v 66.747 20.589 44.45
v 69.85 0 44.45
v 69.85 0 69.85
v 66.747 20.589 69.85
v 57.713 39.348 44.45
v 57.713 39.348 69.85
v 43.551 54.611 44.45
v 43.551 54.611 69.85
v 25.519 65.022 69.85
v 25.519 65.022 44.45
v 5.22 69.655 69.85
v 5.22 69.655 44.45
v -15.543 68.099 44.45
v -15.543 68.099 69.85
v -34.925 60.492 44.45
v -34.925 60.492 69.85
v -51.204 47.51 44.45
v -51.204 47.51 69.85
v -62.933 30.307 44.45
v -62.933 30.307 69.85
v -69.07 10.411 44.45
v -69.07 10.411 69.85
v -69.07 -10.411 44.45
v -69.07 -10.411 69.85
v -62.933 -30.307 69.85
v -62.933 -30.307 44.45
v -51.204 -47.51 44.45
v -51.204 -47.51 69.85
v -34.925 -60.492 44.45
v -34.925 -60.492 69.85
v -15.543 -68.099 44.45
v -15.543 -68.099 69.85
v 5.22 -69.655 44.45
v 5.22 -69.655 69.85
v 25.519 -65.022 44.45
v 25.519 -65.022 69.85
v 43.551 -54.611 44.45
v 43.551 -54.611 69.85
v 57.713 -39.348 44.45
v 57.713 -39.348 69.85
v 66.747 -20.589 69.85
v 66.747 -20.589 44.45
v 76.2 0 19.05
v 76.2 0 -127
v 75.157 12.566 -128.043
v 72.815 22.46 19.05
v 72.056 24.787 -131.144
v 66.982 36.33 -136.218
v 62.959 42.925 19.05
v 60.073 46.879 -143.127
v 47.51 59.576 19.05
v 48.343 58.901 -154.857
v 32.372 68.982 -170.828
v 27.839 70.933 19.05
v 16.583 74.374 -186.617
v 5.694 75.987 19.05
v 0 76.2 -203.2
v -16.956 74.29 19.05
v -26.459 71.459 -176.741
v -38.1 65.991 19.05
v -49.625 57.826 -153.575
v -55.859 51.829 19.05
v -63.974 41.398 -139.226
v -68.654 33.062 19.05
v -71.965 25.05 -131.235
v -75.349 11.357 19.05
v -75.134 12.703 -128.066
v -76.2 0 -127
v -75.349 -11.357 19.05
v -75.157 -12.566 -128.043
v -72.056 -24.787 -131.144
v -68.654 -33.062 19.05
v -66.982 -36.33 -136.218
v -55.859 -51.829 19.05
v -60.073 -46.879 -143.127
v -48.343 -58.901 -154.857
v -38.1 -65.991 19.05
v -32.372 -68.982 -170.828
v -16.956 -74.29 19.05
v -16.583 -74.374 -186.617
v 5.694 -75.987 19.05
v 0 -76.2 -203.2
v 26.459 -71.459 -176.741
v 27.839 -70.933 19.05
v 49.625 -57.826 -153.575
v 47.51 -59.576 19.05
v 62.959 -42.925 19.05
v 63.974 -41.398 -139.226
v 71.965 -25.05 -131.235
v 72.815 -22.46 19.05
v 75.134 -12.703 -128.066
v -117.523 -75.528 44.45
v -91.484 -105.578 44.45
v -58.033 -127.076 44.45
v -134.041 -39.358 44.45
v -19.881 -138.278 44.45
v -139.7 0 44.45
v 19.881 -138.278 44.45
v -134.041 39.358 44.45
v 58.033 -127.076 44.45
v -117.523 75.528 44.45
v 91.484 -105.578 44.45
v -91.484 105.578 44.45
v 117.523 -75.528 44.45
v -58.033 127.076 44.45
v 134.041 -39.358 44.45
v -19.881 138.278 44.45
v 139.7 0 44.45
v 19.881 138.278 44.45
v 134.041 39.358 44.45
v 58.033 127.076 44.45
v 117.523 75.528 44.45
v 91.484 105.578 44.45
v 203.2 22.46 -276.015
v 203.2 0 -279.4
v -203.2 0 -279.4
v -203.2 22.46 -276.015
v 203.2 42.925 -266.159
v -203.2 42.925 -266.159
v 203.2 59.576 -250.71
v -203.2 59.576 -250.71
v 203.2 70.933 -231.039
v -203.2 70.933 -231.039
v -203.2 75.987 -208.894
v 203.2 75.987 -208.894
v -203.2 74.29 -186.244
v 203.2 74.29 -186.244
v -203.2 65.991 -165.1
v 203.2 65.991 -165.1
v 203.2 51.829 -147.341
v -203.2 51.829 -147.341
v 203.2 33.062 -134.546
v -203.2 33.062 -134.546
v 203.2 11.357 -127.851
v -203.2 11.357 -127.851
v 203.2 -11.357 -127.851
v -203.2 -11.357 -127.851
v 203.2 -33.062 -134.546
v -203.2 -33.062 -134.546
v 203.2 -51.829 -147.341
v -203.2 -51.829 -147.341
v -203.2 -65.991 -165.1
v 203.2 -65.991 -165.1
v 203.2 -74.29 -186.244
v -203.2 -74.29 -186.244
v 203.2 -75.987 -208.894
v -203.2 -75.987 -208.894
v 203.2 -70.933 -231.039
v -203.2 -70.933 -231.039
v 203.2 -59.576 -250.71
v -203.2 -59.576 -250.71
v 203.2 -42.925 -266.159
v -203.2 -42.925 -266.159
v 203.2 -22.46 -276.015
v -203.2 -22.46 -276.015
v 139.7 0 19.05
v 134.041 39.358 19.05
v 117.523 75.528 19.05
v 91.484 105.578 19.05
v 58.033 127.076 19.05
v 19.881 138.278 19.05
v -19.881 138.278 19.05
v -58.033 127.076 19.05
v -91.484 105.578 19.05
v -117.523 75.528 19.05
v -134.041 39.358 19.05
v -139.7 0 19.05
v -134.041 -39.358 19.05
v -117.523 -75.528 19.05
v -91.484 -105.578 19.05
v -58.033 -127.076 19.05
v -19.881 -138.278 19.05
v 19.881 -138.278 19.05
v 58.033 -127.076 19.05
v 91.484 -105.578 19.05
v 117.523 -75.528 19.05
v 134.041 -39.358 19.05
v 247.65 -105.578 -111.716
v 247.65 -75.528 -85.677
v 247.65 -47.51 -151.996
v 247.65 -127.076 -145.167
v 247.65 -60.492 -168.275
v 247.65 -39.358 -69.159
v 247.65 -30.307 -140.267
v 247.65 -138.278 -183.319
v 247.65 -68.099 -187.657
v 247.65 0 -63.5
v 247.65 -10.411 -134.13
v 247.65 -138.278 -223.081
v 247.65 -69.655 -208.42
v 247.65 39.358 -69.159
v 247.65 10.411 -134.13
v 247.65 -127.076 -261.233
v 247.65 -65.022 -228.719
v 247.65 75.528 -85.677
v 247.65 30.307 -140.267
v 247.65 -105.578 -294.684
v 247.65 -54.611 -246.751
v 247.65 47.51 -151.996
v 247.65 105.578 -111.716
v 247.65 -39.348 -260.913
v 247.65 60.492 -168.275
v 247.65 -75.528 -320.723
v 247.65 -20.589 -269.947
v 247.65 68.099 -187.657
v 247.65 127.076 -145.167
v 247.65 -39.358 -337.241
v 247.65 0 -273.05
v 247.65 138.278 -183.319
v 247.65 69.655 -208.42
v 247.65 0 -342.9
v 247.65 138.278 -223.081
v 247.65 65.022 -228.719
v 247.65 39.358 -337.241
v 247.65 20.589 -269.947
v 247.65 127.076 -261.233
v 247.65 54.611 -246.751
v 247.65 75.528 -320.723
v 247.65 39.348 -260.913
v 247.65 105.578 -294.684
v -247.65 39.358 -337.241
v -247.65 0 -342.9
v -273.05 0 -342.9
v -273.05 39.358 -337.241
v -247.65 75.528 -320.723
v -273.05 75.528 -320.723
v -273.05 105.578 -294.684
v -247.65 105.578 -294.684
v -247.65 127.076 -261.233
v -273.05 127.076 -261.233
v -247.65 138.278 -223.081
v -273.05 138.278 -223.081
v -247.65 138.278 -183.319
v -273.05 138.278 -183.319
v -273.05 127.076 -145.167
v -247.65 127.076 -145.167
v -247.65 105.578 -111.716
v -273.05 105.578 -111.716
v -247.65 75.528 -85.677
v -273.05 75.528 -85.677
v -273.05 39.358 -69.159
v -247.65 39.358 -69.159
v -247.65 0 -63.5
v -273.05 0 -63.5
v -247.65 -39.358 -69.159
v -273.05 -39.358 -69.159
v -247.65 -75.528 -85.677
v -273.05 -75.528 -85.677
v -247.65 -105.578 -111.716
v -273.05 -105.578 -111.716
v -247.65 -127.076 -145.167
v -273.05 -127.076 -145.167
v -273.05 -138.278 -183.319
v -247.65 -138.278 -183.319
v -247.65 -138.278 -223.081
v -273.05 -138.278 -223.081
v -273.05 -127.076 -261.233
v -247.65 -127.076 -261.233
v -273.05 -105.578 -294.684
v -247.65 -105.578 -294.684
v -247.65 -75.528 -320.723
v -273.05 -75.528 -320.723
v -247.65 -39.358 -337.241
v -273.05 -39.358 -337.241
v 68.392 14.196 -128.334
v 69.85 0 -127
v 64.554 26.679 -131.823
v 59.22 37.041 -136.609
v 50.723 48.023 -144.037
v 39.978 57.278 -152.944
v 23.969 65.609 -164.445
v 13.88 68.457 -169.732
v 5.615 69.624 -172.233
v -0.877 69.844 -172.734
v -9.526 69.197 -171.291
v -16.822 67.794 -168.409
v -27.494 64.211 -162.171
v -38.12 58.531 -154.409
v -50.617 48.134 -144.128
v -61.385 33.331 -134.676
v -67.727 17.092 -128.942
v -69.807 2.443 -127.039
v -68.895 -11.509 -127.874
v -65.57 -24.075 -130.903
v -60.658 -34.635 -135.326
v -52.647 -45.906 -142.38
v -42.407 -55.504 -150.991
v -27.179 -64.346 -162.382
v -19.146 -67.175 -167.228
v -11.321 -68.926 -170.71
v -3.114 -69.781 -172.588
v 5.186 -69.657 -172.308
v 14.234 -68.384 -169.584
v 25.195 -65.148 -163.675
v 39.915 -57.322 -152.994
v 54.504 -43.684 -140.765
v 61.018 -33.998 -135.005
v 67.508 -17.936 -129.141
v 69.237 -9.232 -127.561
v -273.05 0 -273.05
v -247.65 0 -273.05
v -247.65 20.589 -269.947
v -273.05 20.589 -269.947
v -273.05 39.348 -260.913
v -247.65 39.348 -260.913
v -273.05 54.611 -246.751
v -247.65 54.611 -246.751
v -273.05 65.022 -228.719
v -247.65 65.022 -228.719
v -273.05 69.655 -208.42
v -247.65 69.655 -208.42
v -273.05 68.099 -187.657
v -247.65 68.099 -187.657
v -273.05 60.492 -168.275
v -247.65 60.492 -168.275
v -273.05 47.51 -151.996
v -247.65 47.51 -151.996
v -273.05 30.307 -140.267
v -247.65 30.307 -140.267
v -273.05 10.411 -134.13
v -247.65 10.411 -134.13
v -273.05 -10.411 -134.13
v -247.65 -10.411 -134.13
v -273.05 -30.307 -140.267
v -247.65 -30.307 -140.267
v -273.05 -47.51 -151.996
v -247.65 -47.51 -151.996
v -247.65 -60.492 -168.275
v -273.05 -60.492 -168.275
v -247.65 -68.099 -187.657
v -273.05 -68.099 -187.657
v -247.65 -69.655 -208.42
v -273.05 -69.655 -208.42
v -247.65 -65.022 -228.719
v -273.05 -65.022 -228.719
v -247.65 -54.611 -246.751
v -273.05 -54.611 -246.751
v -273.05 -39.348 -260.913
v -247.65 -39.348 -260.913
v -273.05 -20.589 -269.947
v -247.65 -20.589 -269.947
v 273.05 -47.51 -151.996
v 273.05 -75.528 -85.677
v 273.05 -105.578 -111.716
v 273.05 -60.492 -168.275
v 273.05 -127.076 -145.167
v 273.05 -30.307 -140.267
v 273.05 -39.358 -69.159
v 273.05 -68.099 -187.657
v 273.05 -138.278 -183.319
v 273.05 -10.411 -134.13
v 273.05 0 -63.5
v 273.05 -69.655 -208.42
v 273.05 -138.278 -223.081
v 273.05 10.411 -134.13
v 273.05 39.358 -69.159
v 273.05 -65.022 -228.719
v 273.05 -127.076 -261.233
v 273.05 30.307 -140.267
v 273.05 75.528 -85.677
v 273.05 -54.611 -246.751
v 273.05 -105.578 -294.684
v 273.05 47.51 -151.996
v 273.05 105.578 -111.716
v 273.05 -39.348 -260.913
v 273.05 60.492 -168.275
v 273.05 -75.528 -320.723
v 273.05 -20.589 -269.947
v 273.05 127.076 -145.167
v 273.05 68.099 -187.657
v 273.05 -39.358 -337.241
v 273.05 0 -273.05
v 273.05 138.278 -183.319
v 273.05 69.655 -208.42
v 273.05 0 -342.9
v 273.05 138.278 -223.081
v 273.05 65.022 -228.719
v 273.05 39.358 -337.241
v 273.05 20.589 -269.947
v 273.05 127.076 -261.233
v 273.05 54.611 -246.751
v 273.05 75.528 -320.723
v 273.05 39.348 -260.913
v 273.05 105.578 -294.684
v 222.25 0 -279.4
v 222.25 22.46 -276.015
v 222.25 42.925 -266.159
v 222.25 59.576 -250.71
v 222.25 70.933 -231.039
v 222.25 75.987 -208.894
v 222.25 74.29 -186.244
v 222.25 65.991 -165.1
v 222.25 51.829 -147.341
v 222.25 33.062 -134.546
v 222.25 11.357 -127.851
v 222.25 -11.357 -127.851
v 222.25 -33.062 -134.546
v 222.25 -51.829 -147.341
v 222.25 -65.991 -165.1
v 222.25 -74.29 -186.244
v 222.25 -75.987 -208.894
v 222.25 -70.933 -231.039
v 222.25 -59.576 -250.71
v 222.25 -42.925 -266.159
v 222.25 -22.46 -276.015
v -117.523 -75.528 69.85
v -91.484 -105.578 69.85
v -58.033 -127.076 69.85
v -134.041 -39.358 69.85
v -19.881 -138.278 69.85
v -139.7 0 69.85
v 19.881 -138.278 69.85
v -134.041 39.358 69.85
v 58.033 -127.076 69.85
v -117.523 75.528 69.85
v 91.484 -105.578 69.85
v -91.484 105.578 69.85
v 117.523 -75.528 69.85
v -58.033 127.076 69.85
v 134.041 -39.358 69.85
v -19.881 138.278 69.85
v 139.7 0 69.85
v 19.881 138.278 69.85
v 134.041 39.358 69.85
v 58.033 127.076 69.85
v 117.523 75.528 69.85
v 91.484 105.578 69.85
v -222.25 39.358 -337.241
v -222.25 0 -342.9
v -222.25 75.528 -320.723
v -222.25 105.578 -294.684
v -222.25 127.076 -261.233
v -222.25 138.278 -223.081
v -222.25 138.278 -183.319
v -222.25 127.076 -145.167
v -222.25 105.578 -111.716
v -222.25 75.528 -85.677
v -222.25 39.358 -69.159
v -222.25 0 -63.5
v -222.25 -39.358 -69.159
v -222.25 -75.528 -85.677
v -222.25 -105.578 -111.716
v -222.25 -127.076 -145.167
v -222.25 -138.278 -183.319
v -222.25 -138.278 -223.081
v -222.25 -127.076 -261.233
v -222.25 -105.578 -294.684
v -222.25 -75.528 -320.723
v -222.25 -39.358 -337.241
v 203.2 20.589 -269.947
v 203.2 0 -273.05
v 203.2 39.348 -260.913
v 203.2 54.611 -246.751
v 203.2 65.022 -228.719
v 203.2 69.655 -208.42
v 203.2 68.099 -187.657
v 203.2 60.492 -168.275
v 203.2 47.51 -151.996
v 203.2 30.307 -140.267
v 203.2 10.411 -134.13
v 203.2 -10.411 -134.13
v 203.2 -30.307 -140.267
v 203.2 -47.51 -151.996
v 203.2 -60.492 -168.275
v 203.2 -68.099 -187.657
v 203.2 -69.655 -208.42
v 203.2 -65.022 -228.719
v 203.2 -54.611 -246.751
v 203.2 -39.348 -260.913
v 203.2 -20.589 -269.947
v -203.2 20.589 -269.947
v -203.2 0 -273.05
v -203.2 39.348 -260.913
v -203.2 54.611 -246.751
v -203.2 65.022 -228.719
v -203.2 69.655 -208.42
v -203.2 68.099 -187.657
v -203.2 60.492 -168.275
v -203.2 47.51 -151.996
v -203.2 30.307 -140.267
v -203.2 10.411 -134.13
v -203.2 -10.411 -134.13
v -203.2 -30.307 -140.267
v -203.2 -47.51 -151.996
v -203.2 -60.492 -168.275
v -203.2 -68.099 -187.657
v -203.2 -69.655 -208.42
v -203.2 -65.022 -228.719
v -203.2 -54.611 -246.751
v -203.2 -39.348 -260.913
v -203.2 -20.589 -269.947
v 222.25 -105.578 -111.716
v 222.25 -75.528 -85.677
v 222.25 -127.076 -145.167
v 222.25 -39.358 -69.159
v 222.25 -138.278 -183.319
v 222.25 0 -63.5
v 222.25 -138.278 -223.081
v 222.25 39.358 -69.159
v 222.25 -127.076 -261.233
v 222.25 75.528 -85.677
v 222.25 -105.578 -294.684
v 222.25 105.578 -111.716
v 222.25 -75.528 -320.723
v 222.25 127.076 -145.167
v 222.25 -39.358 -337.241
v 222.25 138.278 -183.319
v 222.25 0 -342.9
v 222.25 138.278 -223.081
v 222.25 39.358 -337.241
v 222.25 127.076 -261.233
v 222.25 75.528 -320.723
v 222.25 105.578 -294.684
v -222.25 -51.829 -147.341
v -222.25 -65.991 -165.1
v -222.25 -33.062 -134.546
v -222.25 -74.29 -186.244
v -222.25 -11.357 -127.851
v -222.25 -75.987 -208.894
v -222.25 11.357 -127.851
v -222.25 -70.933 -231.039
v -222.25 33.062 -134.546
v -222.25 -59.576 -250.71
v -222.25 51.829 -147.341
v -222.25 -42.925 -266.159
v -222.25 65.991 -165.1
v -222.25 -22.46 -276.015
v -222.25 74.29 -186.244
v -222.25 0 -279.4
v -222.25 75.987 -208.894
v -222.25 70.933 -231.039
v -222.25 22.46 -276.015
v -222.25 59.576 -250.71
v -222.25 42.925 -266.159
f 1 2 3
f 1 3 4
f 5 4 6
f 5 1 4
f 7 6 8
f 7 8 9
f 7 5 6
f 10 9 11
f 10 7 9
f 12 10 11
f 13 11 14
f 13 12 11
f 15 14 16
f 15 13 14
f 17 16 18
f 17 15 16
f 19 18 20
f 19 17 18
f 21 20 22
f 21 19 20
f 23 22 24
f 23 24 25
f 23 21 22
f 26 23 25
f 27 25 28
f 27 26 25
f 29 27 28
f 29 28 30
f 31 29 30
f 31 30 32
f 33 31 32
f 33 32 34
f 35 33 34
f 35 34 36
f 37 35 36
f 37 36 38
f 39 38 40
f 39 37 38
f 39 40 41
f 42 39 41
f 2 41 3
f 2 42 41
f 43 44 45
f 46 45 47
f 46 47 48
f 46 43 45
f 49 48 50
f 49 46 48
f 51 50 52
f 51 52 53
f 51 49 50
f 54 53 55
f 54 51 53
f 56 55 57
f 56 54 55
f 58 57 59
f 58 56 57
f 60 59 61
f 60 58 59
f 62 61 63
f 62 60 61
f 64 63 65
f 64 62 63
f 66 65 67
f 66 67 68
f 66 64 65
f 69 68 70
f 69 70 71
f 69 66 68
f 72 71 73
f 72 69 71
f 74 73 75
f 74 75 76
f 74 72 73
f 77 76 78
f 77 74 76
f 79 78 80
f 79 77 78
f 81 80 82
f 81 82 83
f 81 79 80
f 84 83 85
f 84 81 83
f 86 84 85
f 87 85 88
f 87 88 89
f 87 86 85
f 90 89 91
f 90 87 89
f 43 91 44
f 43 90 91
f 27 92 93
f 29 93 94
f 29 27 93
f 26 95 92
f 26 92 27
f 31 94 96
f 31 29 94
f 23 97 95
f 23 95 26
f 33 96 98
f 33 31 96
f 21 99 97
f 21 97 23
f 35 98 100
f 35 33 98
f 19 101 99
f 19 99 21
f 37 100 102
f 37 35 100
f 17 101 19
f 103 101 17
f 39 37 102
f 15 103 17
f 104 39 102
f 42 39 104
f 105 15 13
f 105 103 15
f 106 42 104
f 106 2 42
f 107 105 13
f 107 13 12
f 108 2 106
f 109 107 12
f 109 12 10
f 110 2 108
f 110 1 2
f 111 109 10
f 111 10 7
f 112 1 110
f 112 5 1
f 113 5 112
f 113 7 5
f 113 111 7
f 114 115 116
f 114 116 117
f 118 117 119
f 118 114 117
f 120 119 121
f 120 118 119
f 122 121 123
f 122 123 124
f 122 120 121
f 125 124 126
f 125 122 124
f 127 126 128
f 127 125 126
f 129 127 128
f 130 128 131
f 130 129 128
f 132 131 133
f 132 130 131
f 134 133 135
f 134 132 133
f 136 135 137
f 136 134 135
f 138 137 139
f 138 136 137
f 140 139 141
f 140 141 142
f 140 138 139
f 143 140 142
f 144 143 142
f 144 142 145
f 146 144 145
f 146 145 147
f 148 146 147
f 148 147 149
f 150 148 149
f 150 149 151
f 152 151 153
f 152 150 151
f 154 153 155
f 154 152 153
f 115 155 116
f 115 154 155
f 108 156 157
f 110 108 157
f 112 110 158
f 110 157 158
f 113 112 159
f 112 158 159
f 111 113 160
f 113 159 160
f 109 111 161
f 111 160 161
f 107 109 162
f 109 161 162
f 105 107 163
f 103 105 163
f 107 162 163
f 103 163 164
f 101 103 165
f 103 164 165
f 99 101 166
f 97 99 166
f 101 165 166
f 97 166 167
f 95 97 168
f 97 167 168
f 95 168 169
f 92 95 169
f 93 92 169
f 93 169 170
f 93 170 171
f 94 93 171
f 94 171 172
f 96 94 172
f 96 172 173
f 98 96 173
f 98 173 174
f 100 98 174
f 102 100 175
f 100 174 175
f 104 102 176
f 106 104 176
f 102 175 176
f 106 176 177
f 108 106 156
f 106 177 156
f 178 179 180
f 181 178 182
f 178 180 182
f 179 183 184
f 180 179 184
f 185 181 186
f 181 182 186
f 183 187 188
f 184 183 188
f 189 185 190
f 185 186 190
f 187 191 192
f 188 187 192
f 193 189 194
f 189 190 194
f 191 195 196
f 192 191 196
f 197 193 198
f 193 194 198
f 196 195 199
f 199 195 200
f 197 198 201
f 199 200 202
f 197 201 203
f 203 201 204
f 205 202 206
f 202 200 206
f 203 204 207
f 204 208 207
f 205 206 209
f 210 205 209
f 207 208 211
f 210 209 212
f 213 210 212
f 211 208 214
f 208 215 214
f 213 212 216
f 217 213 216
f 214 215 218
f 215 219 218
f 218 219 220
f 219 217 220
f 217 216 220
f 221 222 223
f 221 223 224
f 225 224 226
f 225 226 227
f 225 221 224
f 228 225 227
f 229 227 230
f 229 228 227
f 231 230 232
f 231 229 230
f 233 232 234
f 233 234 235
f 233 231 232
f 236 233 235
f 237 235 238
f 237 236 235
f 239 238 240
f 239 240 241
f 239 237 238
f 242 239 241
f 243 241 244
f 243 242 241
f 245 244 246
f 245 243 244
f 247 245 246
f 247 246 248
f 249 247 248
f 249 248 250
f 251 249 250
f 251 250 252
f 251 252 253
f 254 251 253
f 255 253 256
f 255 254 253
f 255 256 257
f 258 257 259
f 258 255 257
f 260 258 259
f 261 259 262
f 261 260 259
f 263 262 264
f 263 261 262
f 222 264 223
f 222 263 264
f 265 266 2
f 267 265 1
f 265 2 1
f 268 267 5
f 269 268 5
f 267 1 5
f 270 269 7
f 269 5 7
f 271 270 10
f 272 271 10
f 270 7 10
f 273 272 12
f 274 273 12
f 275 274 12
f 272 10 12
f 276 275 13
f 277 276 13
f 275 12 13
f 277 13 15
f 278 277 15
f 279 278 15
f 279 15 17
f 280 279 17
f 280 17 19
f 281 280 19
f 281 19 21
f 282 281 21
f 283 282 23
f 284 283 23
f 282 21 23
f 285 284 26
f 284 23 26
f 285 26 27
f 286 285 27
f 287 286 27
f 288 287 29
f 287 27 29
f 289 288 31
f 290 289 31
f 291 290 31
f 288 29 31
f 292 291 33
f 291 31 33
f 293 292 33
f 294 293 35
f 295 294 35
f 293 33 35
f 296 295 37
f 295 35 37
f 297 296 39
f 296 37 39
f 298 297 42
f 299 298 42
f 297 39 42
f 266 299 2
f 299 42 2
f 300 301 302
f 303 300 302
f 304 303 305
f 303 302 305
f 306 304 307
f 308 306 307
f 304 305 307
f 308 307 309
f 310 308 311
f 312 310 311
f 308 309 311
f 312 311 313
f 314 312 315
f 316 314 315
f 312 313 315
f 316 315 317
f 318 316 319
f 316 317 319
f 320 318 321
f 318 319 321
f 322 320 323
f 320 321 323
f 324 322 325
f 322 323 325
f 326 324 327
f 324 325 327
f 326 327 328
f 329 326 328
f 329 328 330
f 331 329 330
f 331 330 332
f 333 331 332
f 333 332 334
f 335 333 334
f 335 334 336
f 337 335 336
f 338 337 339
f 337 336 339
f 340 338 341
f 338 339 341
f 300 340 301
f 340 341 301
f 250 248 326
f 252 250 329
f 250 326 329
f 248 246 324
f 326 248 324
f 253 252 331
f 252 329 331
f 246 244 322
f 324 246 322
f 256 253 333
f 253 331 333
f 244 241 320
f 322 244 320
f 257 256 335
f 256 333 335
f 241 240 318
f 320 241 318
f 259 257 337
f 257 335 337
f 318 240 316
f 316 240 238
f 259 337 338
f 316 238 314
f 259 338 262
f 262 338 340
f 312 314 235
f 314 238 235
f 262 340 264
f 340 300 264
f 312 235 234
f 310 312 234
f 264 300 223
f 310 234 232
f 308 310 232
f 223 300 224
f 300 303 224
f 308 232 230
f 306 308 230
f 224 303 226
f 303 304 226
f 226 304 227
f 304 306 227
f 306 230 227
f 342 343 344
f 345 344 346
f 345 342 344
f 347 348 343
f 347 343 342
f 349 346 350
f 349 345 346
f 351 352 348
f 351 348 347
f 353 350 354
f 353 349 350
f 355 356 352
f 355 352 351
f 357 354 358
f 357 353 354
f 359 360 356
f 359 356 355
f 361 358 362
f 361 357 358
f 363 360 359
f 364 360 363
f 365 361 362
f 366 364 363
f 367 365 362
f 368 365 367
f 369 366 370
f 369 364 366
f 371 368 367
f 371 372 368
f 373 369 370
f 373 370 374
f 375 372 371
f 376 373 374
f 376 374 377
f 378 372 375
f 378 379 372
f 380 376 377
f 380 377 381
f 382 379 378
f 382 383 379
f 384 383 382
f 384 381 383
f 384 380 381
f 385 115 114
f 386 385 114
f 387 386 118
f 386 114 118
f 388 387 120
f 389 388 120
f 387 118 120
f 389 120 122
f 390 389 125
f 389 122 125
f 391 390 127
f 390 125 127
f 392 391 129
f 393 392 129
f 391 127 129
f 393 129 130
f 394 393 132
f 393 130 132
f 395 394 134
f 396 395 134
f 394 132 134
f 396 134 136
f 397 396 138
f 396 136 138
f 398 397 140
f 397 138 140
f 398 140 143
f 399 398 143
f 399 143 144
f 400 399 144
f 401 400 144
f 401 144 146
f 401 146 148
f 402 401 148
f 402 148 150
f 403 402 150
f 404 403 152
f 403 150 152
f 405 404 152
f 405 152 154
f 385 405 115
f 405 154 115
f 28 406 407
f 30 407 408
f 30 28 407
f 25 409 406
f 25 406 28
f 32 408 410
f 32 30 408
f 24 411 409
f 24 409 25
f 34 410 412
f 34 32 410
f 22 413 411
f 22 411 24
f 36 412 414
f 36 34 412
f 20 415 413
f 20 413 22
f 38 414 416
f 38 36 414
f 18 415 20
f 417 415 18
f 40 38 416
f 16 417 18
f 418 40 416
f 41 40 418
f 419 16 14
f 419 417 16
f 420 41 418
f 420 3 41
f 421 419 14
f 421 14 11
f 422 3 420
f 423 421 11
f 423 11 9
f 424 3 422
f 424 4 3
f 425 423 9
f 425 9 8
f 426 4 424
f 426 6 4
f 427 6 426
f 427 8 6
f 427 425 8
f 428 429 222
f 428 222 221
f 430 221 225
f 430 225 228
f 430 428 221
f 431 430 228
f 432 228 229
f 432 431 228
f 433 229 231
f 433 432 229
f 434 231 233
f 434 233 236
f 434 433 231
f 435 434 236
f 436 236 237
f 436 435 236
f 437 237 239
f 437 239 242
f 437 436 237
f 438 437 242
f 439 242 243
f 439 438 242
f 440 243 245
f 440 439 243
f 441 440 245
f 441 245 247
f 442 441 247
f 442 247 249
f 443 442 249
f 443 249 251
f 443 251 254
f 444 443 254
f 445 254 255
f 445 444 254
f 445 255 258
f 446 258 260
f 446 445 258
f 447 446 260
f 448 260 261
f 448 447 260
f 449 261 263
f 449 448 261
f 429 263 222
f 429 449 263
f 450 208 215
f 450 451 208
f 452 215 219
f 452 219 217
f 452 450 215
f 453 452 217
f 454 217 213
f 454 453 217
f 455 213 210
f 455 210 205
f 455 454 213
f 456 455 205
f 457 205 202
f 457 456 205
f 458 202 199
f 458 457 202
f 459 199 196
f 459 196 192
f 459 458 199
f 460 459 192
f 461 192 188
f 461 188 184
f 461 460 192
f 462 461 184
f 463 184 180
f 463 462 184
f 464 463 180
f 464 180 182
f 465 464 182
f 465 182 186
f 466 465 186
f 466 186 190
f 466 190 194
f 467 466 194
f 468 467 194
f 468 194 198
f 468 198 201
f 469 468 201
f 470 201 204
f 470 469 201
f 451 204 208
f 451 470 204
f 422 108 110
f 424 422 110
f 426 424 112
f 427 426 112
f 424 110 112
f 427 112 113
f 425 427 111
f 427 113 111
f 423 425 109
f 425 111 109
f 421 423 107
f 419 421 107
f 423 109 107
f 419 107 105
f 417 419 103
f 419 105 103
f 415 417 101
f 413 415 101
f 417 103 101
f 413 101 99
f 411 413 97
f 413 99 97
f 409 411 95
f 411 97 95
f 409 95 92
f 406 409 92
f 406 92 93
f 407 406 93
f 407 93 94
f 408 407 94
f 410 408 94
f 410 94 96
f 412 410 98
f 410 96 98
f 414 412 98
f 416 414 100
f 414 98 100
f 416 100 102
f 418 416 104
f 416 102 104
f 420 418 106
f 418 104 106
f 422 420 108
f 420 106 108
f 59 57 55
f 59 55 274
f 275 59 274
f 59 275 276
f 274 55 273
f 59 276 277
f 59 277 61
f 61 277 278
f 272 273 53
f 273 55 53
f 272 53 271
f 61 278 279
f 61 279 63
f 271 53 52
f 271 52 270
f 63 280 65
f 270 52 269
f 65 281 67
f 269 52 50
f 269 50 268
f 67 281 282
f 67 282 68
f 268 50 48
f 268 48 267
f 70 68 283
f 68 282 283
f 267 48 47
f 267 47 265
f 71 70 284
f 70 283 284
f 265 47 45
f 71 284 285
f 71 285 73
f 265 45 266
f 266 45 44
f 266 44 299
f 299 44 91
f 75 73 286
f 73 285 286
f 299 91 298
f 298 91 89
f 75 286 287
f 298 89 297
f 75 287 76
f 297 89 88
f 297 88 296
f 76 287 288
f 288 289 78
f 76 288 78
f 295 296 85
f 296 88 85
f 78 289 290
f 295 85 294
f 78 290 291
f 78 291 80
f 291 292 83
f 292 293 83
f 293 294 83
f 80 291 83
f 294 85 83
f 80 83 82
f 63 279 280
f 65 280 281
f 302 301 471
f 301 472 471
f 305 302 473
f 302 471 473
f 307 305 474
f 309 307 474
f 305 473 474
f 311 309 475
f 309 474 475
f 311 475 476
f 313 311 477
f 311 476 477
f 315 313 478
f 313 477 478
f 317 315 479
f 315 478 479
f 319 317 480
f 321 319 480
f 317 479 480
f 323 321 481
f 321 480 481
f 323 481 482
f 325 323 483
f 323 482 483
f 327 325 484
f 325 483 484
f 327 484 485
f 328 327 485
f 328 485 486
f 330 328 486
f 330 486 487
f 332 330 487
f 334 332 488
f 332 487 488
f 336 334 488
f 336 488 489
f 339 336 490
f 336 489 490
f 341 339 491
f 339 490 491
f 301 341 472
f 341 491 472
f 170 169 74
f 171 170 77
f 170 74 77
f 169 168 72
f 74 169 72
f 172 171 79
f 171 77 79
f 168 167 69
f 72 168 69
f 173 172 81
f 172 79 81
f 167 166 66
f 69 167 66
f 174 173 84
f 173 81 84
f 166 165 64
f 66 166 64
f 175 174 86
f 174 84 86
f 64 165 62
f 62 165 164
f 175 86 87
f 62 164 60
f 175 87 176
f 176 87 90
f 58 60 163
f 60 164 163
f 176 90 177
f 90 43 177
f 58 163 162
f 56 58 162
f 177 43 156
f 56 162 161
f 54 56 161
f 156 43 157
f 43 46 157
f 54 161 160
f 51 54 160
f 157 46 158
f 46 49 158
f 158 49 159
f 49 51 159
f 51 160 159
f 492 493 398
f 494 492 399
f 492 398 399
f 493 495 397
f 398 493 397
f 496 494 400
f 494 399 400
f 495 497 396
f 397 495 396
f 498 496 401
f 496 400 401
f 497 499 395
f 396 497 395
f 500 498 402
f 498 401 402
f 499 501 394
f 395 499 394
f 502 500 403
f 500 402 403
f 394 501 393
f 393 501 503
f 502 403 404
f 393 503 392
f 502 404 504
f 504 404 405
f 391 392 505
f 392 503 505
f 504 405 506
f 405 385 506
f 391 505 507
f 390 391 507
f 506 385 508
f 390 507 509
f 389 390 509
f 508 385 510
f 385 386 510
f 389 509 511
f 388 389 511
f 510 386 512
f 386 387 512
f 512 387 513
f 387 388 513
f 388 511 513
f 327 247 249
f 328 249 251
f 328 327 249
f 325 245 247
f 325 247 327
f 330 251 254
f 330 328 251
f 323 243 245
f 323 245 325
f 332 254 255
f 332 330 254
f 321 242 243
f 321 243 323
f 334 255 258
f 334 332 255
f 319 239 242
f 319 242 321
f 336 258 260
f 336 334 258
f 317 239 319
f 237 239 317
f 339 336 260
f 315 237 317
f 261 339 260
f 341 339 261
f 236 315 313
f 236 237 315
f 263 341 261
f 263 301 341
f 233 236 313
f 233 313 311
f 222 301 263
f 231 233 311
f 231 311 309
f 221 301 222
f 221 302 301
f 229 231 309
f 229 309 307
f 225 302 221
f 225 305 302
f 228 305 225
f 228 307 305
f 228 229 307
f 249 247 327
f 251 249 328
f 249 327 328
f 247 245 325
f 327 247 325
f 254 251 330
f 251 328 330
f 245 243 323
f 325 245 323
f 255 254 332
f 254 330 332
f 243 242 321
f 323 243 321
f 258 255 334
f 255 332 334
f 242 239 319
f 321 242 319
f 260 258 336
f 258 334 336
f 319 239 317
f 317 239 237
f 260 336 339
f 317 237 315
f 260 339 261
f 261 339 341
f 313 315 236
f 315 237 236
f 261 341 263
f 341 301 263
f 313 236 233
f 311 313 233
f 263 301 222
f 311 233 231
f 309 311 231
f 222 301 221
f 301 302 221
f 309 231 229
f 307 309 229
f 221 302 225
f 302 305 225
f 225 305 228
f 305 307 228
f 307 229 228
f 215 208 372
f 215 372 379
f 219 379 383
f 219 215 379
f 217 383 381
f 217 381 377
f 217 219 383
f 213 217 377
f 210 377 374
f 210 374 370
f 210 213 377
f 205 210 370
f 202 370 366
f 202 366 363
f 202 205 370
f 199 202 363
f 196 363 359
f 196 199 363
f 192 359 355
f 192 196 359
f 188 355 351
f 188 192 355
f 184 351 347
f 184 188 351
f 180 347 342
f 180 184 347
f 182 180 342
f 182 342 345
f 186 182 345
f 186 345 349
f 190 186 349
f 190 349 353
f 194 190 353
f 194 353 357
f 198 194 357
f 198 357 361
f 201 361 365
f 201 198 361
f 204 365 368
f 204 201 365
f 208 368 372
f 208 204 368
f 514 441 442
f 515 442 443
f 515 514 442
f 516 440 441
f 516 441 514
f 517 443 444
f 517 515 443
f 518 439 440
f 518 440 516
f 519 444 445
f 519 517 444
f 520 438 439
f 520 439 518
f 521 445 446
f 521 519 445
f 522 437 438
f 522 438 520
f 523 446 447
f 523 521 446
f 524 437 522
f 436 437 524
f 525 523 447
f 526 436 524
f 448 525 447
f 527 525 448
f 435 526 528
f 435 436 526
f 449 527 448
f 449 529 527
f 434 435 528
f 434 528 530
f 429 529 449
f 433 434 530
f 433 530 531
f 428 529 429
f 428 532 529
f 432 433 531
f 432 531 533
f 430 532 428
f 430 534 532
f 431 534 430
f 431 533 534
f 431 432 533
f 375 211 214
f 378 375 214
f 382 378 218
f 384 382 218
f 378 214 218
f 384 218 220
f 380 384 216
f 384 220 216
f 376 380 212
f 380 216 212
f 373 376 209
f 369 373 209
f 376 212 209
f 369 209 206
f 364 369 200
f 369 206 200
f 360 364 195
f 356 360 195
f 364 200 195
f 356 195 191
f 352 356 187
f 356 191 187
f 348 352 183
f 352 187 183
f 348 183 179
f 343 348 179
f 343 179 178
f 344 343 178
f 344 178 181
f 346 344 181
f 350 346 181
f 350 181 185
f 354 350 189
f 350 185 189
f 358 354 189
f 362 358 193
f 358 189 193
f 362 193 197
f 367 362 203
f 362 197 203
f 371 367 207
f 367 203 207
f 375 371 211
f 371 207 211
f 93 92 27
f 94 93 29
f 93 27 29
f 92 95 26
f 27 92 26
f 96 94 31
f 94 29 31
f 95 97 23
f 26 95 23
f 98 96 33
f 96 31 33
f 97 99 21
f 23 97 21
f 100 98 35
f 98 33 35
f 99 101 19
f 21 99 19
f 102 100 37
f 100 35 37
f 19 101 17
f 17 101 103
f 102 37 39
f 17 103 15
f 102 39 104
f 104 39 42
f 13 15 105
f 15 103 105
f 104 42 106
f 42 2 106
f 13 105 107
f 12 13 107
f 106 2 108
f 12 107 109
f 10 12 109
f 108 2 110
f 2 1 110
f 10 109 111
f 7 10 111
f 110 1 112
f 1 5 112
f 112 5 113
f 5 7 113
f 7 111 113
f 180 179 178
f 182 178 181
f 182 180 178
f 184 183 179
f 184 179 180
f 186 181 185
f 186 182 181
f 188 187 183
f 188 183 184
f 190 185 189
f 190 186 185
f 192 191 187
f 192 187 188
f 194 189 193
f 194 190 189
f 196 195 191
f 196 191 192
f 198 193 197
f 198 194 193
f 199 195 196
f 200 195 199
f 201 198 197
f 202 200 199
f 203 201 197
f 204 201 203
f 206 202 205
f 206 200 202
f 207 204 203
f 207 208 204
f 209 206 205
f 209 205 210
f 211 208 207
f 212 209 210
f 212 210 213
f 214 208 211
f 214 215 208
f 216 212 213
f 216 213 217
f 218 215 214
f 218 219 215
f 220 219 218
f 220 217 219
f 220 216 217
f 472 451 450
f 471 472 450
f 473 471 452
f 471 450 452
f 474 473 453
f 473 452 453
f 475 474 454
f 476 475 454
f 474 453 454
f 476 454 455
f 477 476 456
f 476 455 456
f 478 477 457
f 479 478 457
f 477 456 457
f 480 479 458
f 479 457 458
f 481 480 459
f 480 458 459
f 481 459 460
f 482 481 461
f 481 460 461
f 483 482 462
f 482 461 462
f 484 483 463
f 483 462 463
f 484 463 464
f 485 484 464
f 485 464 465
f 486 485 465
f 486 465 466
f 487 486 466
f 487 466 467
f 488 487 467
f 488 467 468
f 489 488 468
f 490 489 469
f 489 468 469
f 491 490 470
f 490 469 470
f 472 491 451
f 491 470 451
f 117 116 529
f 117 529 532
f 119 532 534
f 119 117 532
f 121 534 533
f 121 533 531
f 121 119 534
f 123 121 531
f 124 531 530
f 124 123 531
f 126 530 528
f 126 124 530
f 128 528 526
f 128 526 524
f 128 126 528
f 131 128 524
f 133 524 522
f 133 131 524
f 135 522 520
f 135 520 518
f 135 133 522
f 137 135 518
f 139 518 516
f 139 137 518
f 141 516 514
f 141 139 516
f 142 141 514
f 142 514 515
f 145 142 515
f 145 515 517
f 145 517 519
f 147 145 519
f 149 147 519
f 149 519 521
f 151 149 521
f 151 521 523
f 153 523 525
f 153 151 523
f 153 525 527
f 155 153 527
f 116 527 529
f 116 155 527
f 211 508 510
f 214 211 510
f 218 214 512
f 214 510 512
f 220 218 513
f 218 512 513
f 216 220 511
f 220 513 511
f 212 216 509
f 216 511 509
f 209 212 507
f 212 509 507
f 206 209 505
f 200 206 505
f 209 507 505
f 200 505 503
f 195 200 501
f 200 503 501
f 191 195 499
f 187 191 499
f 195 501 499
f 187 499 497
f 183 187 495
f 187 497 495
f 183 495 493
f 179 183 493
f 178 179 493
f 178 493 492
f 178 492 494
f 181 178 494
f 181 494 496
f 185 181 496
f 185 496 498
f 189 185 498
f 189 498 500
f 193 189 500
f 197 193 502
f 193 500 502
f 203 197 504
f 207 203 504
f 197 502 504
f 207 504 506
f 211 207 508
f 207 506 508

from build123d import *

# Parameters (mm, degrees)
F0_R      = 76.2
F0_R_2    = 69.85
F1_DEPTH  = 19.05
F2_R      = 139.7
F2_R_2    = 76.2
F2_R_3    = 69.85
F3_DEPTH  = 25.4
F9_ANGLE  = 90
F11_DEPTH = 406.4
F12_REACH = 558.4271469057
F13_DEPTH = 25.4
F14_DEPTH = 25.4
F15_DEPTH = 25.4


with BuildPart() as f1:
    # F0 (on Top) → F1 (new body)
    with BuildSketch(Plane.XY):
        Circle(F0_R)
        Circle(F0_R_2, mode=Mode.SUBTRACT)
    extrude(amount=F1_DEPTH)

    # F2 (on face) → F3 (join)
    with BuildSketch(Plane.XY.offset(19.05)):
        Circle(F2_R)
        Circle(F2_R_2, mode=Mode.SUBTRACT)
        Circle(F2_R_2)
        Circle(F2_R_3, mode=Mode.SUBTRACT)
    extrude(amount=F3_DEPTH)


with BuildPart() as f7_1:
    # F7: copy of F1
    add(f1.part.moved(Location((203.2, 0, -203.2))))


with BuildPart() as f7_1_1:
    # F9: moved
    add(f7_1.part.rotate(Axis((203.2, 122.1911609173, -203.2), (0, 1, 0)), F9_ANGLE))


with BuildPart() as f10_1:
    # F10: instance of F7_1
    add(f7_1_1.part.mirror(Plane.YZ))


with BuildPart() as f7_1_2:
    add(f7_1_1.part)

    # F11 (add, through all): a face of the model
    f11_faces = [f7_1_2.faces().sort_by_distance(p)[0] for p in [
        (203.2, 0, -129.1552614691),
    ]]

    add(f10_1.part)  # F11 merges F10_1
    extrude(f11_faces, amount=F11_DEPTH)


with BuildPart() as f1_1:
    add(f1.part)

    f12_end = f7_1_2.part.faces().sort_by_distance((0, 0, -127))[0]
    # F0 (on Top) → F12 (join, up to a face of F7_1 that its end follows)
    with BuildSketch(Plane.XY):
        Circle(F0_R)
        Circle(F0_R_2, mode=Mode.SUBTRACT)
    f12_long = extrude(amount=-F12_REACH, mode=Mode.PRIVATE)
    add(split(f12_long, bisect_by=f12_end, keep=Keep.ALL, mode=Mode.PRIVATE).solids().sort_by_distance((-74.0447385309, 0, 0))[0])


with BuildPart() as f13:
    # F13 (new): a face of the model
    f13_faces = [f1_1.part.faces().sort_by_distance(p)[0] for p in [
        (-135.7486873067, 0, 44.45),
    ]]
    extrude(f13_faces, amount=F13_DEPTH)


with BuildPart() as f14:
    # F14 (new): a face of the model
    f14_faces = [f7_1_2.part.faces().sort_by_distance(p)[0] for p in [
        (247.65, 0, -67.4513126933),
    ]]
    extrude(f14_faces, amount=F14_DEPTH)


with BuildPart() as f15:
    # F15 (new): a face of the model
    f15_faces = [f7_1_2.part.faces().sort_by_distance(p)[0] for p in [
        (-247.65, 0, -67.4513126933),
    ]]
    extrude(f15_faces, amount=F15_DEPTH)


solid = Compound([f7_1_2.part, f1_1.part, f13.part, f14.part, f15.part])
